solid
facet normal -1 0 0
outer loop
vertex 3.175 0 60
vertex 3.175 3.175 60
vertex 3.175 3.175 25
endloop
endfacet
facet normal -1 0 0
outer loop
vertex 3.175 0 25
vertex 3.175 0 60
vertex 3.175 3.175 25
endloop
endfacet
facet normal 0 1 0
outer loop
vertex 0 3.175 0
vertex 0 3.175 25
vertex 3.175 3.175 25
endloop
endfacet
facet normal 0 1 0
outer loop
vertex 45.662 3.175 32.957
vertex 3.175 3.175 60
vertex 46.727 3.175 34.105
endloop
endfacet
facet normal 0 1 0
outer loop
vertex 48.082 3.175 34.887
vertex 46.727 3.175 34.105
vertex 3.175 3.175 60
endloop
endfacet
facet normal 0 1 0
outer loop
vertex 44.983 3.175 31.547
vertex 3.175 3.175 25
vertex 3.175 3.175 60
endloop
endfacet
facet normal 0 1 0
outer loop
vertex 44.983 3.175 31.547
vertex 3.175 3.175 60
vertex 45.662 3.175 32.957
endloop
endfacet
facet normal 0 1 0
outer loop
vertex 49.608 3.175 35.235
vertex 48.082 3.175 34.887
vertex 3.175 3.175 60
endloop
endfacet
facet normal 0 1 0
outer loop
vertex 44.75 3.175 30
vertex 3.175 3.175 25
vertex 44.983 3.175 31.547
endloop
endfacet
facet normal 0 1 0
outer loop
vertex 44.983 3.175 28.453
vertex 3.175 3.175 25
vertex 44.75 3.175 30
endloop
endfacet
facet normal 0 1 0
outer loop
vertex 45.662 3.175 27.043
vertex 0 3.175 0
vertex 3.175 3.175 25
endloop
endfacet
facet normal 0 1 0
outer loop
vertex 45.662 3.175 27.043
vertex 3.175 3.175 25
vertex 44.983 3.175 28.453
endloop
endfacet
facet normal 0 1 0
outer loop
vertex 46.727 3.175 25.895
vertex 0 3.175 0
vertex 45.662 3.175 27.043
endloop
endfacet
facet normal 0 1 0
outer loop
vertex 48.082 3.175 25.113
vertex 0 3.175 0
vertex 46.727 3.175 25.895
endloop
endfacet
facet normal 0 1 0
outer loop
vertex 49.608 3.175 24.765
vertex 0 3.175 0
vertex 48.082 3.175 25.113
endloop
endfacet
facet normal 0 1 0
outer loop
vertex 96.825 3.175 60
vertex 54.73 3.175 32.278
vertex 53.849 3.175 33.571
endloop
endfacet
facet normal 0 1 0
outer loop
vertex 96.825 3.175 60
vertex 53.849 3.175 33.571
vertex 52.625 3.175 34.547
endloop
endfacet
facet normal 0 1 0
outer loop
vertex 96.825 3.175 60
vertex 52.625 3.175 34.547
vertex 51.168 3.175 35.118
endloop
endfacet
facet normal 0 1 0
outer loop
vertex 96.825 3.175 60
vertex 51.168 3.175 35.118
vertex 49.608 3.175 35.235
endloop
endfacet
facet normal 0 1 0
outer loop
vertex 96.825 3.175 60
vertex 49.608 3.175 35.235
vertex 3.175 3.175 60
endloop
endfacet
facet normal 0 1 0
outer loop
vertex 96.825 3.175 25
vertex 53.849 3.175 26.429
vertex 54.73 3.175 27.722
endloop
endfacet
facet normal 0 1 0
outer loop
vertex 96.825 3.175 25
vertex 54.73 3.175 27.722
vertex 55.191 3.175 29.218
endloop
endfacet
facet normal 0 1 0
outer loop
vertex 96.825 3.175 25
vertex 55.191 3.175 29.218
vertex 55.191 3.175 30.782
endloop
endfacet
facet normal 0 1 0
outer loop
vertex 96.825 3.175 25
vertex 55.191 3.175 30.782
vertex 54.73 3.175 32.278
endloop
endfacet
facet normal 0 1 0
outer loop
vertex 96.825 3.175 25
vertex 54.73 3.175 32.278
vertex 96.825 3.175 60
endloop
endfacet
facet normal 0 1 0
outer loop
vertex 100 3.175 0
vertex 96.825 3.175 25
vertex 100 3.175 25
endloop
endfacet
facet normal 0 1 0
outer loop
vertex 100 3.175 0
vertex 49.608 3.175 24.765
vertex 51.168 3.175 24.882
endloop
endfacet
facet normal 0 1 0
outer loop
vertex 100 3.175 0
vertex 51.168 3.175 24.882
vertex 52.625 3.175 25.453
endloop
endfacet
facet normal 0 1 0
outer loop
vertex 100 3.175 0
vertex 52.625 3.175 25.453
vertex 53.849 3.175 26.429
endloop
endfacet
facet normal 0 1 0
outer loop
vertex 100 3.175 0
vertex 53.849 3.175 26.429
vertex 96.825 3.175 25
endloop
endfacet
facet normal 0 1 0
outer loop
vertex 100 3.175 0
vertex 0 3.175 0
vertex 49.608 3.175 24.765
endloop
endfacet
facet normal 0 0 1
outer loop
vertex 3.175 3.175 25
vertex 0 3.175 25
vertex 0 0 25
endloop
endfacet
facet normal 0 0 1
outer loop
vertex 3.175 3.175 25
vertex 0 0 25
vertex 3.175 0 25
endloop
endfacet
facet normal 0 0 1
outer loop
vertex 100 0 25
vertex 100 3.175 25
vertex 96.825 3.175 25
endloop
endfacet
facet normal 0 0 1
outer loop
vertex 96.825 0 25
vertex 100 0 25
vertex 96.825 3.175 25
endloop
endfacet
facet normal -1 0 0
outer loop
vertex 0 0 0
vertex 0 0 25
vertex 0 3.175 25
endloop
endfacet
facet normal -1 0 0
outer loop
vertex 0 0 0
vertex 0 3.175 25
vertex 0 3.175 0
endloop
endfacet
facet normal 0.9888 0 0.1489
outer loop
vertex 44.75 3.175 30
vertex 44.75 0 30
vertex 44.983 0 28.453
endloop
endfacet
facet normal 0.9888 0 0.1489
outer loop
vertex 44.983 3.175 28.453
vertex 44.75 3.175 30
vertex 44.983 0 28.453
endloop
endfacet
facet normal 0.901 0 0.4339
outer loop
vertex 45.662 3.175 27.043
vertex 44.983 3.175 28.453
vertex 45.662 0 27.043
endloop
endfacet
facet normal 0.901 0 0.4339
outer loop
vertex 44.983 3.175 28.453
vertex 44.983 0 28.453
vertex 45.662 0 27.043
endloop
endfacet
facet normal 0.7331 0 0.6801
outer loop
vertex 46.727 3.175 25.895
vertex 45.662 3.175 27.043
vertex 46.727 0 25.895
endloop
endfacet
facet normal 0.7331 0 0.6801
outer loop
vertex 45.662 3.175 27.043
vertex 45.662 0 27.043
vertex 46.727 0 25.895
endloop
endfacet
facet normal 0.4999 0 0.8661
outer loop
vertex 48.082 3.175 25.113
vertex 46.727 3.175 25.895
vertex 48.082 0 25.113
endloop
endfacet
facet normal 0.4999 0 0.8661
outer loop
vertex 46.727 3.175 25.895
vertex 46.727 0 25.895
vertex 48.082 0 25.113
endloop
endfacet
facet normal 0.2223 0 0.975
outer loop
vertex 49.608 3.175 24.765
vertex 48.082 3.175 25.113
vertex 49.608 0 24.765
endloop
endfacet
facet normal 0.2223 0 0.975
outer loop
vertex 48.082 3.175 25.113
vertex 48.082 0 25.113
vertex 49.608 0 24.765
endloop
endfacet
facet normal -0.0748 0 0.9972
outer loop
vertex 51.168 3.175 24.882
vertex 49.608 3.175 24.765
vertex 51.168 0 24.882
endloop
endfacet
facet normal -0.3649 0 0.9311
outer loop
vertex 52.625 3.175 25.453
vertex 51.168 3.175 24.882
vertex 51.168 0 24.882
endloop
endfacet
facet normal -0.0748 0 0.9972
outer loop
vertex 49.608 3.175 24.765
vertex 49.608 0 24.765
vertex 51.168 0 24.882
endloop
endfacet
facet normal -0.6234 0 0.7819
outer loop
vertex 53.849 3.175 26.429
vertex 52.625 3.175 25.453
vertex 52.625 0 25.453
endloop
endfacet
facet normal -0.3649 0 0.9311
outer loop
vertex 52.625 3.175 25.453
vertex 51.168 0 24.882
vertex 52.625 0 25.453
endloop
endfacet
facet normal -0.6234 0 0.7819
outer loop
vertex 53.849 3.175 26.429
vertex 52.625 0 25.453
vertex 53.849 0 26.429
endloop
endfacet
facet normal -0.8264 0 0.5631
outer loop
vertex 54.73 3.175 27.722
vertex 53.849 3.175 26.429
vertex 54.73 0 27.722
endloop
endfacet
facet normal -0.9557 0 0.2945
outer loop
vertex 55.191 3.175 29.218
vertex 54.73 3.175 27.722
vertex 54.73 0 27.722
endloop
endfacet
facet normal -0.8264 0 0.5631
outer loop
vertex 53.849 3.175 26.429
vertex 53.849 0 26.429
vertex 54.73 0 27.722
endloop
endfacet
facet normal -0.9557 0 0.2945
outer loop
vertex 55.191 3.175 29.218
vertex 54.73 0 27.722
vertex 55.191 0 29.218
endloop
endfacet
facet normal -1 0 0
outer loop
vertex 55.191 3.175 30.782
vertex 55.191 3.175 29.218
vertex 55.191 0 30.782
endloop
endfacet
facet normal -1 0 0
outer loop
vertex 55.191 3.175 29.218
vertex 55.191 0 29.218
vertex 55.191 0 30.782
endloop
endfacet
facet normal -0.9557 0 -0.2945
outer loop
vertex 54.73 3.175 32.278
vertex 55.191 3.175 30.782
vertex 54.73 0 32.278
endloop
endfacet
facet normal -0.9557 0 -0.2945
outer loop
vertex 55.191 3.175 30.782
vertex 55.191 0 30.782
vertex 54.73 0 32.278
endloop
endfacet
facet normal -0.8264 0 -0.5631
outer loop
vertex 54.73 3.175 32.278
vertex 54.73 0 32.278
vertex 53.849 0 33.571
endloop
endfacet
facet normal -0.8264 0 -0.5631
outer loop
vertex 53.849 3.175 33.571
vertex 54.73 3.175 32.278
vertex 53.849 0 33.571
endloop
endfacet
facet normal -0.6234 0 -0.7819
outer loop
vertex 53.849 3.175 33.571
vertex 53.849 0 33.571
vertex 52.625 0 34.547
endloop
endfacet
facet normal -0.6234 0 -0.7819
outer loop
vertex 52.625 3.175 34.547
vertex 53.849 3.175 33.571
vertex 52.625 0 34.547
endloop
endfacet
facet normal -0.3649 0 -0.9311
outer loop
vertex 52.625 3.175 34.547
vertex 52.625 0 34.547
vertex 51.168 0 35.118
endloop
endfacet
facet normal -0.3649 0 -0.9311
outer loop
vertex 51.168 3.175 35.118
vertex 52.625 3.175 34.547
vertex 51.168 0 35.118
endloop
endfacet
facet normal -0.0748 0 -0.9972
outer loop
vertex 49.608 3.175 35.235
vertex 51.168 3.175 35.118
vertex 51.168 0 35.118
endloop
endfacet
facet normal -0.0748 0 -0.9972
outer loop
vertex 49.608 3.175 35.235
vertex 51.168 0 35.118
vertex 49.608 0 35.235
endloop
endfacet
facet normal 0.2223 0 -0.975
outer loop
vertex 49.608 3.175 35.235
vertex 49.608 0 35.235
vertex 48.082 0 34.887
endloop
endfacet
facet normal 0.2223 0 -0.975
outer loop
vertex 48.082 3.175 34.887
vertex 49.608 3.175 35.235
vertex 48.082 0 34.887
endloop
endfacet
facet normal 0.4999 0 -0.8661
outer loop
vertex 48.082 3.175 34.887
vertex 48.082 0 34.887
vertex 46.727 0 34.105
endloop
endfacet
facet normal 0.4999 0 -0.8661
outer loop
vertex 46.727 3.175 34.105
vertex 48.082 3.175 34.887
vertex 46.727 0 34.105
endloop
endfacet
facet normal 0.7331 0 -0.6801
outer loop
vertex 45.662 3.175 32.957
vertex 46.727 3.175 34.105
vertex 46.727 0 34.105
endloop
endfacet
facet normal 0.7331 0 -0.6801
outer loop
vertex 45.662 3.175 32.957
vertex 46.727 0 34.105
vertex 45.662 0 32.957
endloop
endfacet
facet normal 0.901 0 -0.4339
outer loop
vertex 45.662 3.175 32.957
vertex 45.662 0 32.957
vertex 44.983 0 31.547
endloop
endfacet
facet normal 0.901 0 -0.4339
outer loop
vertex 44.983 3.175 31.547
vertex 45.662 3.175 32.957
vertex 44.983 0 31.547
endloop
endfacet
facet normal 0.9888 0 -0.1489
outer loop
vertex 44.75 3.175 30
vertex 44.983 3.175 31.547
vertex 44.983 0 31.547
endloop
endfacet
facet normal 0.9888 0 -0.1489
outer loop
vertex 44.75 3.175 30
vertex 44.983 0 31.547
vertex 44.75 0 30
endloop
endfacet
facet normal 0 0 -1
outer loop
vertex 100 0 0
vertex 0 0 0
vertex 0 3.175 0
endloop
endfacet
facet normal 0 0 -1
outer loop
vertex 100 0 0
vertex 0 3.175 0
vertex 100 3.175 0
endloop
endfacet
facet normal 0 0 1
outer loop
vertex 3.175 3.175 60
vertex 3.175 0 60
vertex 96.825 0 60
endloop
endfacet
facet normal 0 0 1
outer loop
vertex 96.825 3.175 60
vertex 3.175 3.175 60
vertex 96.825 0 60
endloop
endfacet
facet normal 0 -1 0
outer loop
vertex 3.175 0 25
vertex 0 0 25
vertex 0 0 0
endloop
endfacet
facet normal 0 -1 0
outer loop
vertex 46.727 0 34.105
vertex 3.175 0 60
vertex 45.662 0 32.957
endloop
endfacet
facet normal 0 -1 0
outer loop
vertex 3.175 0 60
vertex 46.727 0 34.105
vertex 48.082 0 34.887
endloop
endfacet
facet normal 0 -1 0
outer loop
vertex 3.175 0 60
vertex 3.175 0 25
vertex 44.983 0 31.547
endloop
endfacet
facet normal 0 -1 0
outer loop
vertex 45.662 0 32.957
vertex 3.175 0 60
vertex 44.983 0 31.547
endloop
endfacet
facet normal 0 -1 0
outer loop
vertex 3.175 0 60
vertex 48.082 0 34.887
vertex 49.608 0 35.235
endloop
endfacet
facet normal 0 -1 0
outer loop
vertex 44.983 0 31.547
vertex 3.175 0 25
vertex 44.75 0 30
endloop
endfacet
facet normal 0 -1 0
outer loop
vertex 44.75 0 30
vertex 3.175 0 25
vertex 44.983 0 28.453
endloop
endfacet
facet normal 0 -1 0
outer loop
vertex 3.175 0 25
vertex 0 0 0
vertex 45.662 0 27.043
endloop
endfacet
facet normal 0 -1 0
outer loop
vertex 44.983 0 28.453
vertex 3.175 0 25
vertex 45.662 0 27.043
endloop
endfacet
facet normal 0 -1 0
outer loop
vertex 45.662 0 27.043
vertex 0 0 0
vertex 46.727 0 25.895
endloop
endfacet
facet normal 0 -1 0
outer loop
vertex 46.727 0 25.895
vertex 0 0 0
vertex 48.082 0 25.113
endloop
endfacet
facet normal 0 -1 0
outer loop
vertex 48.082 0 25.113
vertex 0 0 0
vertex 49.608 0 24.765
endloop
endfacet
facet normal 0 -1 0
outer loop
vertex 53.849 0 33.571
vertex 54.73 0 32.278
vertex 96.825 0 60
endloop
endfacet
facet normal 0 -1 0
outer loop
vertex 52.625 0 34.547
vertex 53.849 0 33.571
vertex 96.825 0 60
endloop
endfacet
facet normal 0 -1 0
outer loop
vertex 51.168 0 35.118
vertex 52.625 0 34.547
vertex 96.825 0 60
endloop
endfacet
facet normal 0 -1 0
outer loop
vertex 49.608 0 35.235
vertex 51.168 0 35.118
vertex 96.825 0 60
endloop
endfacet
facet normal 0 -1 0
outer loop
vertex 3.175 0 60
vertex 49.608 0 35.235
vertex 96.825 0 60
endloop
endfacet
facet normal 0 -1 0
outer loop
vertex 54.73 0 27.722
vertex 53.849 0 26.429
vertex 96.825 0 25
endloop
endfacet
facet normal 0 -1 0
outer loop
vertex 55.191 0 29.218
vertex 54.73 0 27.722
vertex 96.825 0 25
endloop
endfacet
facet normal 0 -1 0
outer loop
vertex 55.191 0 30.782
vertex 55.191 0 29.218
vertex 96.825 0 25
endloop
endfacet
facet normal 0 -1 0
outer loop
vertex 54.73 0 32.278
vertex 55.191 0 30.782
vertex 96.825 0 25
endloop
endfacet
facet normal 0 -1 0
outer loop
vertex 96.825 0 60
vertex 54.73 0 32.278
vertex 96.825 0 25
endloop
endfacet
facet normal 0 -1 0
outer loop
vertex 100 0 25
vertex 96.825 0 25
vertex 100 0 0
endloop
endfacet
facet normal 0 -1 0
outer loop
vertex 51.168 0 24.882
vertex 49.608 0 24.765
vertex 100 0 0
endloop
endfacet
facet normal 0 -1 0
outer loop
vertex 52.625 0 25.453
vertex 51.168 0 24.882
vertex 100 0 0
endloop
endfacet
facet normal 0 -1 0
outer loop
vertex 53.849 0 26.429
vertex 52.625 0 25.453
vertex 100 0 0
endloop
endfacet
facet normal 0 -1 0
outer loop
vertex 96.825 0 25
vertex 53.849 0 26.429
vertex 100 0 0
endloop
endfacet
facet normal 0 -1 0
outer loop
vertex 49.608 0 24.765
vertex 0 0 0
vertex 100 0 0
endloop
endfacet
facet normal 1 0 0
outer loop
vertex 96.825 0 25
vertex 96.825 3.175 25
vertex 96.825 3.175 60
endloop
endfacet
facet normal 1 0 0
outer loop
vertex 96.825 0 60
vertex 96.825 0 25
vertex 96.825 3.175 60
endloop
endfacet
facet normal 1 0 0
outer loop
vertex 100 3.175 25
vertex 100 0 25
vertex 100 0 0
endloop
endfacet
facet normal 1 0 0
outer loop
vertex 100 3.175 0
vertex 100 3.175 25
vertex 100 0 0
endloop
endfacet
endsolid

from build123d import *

# Parameters (mm, degrees)
SKETCH1_W                    = 100
SKETCH1_H                    = 60
BOSS_EXTRUDE1_DEPTH          = 3.175
CUT_EXTRUDE1_DEPTH           = 3.175
TAP_DRILL_FOR_M12X1_5_TAP1_D = 10.5


with BuildPart() as part:
    # Sketch1 → Boss-Extrude1 (new body)
    with BuildSketch(Plane(origin=(0, 0, 0), x_dir=(1, 0, 0), z_dir=(0, 1, 0))):
        with Locations((50, -30)):
            Rectangle(SKETCH1_W, SKETCH1_H)
    extrude(amount=BOSS_EXTRUDE1_DEPTH)

    # Sketch2 → Cut-Extrude1 (cut)
    with BuildSketch(Plane(origin=(0, 3.175, 0), x_dir=(1, 0, 0), z_dir=(0, 1, 0))):
        Polygon((3.175, -25), (3.175, -35), (3.175, -60), (0, -60), (0, -45), (0, -25), align=None)
        Polygon((100, -25), (96.825, -25), (96.825, -35), (96.825, -60), (100, -60), (100, -45), align=None)
    extrude(amount=-CUT_EXTRUDE1_DEPTH, mode=Mode.SUBTRACT)

    # Tap Drill for M12x1.5 Tap1 (through all)
    with Locations(Plane(origin=(0, 3.175, 0), x_dir=(1, 0, 0), z_dir=(0, 1, 0))):
        with Locations((50, -30)):
            Hole(TAP_DRILL_FOR_M12X1_5_TAP1_D / 2)


solid = part.part
